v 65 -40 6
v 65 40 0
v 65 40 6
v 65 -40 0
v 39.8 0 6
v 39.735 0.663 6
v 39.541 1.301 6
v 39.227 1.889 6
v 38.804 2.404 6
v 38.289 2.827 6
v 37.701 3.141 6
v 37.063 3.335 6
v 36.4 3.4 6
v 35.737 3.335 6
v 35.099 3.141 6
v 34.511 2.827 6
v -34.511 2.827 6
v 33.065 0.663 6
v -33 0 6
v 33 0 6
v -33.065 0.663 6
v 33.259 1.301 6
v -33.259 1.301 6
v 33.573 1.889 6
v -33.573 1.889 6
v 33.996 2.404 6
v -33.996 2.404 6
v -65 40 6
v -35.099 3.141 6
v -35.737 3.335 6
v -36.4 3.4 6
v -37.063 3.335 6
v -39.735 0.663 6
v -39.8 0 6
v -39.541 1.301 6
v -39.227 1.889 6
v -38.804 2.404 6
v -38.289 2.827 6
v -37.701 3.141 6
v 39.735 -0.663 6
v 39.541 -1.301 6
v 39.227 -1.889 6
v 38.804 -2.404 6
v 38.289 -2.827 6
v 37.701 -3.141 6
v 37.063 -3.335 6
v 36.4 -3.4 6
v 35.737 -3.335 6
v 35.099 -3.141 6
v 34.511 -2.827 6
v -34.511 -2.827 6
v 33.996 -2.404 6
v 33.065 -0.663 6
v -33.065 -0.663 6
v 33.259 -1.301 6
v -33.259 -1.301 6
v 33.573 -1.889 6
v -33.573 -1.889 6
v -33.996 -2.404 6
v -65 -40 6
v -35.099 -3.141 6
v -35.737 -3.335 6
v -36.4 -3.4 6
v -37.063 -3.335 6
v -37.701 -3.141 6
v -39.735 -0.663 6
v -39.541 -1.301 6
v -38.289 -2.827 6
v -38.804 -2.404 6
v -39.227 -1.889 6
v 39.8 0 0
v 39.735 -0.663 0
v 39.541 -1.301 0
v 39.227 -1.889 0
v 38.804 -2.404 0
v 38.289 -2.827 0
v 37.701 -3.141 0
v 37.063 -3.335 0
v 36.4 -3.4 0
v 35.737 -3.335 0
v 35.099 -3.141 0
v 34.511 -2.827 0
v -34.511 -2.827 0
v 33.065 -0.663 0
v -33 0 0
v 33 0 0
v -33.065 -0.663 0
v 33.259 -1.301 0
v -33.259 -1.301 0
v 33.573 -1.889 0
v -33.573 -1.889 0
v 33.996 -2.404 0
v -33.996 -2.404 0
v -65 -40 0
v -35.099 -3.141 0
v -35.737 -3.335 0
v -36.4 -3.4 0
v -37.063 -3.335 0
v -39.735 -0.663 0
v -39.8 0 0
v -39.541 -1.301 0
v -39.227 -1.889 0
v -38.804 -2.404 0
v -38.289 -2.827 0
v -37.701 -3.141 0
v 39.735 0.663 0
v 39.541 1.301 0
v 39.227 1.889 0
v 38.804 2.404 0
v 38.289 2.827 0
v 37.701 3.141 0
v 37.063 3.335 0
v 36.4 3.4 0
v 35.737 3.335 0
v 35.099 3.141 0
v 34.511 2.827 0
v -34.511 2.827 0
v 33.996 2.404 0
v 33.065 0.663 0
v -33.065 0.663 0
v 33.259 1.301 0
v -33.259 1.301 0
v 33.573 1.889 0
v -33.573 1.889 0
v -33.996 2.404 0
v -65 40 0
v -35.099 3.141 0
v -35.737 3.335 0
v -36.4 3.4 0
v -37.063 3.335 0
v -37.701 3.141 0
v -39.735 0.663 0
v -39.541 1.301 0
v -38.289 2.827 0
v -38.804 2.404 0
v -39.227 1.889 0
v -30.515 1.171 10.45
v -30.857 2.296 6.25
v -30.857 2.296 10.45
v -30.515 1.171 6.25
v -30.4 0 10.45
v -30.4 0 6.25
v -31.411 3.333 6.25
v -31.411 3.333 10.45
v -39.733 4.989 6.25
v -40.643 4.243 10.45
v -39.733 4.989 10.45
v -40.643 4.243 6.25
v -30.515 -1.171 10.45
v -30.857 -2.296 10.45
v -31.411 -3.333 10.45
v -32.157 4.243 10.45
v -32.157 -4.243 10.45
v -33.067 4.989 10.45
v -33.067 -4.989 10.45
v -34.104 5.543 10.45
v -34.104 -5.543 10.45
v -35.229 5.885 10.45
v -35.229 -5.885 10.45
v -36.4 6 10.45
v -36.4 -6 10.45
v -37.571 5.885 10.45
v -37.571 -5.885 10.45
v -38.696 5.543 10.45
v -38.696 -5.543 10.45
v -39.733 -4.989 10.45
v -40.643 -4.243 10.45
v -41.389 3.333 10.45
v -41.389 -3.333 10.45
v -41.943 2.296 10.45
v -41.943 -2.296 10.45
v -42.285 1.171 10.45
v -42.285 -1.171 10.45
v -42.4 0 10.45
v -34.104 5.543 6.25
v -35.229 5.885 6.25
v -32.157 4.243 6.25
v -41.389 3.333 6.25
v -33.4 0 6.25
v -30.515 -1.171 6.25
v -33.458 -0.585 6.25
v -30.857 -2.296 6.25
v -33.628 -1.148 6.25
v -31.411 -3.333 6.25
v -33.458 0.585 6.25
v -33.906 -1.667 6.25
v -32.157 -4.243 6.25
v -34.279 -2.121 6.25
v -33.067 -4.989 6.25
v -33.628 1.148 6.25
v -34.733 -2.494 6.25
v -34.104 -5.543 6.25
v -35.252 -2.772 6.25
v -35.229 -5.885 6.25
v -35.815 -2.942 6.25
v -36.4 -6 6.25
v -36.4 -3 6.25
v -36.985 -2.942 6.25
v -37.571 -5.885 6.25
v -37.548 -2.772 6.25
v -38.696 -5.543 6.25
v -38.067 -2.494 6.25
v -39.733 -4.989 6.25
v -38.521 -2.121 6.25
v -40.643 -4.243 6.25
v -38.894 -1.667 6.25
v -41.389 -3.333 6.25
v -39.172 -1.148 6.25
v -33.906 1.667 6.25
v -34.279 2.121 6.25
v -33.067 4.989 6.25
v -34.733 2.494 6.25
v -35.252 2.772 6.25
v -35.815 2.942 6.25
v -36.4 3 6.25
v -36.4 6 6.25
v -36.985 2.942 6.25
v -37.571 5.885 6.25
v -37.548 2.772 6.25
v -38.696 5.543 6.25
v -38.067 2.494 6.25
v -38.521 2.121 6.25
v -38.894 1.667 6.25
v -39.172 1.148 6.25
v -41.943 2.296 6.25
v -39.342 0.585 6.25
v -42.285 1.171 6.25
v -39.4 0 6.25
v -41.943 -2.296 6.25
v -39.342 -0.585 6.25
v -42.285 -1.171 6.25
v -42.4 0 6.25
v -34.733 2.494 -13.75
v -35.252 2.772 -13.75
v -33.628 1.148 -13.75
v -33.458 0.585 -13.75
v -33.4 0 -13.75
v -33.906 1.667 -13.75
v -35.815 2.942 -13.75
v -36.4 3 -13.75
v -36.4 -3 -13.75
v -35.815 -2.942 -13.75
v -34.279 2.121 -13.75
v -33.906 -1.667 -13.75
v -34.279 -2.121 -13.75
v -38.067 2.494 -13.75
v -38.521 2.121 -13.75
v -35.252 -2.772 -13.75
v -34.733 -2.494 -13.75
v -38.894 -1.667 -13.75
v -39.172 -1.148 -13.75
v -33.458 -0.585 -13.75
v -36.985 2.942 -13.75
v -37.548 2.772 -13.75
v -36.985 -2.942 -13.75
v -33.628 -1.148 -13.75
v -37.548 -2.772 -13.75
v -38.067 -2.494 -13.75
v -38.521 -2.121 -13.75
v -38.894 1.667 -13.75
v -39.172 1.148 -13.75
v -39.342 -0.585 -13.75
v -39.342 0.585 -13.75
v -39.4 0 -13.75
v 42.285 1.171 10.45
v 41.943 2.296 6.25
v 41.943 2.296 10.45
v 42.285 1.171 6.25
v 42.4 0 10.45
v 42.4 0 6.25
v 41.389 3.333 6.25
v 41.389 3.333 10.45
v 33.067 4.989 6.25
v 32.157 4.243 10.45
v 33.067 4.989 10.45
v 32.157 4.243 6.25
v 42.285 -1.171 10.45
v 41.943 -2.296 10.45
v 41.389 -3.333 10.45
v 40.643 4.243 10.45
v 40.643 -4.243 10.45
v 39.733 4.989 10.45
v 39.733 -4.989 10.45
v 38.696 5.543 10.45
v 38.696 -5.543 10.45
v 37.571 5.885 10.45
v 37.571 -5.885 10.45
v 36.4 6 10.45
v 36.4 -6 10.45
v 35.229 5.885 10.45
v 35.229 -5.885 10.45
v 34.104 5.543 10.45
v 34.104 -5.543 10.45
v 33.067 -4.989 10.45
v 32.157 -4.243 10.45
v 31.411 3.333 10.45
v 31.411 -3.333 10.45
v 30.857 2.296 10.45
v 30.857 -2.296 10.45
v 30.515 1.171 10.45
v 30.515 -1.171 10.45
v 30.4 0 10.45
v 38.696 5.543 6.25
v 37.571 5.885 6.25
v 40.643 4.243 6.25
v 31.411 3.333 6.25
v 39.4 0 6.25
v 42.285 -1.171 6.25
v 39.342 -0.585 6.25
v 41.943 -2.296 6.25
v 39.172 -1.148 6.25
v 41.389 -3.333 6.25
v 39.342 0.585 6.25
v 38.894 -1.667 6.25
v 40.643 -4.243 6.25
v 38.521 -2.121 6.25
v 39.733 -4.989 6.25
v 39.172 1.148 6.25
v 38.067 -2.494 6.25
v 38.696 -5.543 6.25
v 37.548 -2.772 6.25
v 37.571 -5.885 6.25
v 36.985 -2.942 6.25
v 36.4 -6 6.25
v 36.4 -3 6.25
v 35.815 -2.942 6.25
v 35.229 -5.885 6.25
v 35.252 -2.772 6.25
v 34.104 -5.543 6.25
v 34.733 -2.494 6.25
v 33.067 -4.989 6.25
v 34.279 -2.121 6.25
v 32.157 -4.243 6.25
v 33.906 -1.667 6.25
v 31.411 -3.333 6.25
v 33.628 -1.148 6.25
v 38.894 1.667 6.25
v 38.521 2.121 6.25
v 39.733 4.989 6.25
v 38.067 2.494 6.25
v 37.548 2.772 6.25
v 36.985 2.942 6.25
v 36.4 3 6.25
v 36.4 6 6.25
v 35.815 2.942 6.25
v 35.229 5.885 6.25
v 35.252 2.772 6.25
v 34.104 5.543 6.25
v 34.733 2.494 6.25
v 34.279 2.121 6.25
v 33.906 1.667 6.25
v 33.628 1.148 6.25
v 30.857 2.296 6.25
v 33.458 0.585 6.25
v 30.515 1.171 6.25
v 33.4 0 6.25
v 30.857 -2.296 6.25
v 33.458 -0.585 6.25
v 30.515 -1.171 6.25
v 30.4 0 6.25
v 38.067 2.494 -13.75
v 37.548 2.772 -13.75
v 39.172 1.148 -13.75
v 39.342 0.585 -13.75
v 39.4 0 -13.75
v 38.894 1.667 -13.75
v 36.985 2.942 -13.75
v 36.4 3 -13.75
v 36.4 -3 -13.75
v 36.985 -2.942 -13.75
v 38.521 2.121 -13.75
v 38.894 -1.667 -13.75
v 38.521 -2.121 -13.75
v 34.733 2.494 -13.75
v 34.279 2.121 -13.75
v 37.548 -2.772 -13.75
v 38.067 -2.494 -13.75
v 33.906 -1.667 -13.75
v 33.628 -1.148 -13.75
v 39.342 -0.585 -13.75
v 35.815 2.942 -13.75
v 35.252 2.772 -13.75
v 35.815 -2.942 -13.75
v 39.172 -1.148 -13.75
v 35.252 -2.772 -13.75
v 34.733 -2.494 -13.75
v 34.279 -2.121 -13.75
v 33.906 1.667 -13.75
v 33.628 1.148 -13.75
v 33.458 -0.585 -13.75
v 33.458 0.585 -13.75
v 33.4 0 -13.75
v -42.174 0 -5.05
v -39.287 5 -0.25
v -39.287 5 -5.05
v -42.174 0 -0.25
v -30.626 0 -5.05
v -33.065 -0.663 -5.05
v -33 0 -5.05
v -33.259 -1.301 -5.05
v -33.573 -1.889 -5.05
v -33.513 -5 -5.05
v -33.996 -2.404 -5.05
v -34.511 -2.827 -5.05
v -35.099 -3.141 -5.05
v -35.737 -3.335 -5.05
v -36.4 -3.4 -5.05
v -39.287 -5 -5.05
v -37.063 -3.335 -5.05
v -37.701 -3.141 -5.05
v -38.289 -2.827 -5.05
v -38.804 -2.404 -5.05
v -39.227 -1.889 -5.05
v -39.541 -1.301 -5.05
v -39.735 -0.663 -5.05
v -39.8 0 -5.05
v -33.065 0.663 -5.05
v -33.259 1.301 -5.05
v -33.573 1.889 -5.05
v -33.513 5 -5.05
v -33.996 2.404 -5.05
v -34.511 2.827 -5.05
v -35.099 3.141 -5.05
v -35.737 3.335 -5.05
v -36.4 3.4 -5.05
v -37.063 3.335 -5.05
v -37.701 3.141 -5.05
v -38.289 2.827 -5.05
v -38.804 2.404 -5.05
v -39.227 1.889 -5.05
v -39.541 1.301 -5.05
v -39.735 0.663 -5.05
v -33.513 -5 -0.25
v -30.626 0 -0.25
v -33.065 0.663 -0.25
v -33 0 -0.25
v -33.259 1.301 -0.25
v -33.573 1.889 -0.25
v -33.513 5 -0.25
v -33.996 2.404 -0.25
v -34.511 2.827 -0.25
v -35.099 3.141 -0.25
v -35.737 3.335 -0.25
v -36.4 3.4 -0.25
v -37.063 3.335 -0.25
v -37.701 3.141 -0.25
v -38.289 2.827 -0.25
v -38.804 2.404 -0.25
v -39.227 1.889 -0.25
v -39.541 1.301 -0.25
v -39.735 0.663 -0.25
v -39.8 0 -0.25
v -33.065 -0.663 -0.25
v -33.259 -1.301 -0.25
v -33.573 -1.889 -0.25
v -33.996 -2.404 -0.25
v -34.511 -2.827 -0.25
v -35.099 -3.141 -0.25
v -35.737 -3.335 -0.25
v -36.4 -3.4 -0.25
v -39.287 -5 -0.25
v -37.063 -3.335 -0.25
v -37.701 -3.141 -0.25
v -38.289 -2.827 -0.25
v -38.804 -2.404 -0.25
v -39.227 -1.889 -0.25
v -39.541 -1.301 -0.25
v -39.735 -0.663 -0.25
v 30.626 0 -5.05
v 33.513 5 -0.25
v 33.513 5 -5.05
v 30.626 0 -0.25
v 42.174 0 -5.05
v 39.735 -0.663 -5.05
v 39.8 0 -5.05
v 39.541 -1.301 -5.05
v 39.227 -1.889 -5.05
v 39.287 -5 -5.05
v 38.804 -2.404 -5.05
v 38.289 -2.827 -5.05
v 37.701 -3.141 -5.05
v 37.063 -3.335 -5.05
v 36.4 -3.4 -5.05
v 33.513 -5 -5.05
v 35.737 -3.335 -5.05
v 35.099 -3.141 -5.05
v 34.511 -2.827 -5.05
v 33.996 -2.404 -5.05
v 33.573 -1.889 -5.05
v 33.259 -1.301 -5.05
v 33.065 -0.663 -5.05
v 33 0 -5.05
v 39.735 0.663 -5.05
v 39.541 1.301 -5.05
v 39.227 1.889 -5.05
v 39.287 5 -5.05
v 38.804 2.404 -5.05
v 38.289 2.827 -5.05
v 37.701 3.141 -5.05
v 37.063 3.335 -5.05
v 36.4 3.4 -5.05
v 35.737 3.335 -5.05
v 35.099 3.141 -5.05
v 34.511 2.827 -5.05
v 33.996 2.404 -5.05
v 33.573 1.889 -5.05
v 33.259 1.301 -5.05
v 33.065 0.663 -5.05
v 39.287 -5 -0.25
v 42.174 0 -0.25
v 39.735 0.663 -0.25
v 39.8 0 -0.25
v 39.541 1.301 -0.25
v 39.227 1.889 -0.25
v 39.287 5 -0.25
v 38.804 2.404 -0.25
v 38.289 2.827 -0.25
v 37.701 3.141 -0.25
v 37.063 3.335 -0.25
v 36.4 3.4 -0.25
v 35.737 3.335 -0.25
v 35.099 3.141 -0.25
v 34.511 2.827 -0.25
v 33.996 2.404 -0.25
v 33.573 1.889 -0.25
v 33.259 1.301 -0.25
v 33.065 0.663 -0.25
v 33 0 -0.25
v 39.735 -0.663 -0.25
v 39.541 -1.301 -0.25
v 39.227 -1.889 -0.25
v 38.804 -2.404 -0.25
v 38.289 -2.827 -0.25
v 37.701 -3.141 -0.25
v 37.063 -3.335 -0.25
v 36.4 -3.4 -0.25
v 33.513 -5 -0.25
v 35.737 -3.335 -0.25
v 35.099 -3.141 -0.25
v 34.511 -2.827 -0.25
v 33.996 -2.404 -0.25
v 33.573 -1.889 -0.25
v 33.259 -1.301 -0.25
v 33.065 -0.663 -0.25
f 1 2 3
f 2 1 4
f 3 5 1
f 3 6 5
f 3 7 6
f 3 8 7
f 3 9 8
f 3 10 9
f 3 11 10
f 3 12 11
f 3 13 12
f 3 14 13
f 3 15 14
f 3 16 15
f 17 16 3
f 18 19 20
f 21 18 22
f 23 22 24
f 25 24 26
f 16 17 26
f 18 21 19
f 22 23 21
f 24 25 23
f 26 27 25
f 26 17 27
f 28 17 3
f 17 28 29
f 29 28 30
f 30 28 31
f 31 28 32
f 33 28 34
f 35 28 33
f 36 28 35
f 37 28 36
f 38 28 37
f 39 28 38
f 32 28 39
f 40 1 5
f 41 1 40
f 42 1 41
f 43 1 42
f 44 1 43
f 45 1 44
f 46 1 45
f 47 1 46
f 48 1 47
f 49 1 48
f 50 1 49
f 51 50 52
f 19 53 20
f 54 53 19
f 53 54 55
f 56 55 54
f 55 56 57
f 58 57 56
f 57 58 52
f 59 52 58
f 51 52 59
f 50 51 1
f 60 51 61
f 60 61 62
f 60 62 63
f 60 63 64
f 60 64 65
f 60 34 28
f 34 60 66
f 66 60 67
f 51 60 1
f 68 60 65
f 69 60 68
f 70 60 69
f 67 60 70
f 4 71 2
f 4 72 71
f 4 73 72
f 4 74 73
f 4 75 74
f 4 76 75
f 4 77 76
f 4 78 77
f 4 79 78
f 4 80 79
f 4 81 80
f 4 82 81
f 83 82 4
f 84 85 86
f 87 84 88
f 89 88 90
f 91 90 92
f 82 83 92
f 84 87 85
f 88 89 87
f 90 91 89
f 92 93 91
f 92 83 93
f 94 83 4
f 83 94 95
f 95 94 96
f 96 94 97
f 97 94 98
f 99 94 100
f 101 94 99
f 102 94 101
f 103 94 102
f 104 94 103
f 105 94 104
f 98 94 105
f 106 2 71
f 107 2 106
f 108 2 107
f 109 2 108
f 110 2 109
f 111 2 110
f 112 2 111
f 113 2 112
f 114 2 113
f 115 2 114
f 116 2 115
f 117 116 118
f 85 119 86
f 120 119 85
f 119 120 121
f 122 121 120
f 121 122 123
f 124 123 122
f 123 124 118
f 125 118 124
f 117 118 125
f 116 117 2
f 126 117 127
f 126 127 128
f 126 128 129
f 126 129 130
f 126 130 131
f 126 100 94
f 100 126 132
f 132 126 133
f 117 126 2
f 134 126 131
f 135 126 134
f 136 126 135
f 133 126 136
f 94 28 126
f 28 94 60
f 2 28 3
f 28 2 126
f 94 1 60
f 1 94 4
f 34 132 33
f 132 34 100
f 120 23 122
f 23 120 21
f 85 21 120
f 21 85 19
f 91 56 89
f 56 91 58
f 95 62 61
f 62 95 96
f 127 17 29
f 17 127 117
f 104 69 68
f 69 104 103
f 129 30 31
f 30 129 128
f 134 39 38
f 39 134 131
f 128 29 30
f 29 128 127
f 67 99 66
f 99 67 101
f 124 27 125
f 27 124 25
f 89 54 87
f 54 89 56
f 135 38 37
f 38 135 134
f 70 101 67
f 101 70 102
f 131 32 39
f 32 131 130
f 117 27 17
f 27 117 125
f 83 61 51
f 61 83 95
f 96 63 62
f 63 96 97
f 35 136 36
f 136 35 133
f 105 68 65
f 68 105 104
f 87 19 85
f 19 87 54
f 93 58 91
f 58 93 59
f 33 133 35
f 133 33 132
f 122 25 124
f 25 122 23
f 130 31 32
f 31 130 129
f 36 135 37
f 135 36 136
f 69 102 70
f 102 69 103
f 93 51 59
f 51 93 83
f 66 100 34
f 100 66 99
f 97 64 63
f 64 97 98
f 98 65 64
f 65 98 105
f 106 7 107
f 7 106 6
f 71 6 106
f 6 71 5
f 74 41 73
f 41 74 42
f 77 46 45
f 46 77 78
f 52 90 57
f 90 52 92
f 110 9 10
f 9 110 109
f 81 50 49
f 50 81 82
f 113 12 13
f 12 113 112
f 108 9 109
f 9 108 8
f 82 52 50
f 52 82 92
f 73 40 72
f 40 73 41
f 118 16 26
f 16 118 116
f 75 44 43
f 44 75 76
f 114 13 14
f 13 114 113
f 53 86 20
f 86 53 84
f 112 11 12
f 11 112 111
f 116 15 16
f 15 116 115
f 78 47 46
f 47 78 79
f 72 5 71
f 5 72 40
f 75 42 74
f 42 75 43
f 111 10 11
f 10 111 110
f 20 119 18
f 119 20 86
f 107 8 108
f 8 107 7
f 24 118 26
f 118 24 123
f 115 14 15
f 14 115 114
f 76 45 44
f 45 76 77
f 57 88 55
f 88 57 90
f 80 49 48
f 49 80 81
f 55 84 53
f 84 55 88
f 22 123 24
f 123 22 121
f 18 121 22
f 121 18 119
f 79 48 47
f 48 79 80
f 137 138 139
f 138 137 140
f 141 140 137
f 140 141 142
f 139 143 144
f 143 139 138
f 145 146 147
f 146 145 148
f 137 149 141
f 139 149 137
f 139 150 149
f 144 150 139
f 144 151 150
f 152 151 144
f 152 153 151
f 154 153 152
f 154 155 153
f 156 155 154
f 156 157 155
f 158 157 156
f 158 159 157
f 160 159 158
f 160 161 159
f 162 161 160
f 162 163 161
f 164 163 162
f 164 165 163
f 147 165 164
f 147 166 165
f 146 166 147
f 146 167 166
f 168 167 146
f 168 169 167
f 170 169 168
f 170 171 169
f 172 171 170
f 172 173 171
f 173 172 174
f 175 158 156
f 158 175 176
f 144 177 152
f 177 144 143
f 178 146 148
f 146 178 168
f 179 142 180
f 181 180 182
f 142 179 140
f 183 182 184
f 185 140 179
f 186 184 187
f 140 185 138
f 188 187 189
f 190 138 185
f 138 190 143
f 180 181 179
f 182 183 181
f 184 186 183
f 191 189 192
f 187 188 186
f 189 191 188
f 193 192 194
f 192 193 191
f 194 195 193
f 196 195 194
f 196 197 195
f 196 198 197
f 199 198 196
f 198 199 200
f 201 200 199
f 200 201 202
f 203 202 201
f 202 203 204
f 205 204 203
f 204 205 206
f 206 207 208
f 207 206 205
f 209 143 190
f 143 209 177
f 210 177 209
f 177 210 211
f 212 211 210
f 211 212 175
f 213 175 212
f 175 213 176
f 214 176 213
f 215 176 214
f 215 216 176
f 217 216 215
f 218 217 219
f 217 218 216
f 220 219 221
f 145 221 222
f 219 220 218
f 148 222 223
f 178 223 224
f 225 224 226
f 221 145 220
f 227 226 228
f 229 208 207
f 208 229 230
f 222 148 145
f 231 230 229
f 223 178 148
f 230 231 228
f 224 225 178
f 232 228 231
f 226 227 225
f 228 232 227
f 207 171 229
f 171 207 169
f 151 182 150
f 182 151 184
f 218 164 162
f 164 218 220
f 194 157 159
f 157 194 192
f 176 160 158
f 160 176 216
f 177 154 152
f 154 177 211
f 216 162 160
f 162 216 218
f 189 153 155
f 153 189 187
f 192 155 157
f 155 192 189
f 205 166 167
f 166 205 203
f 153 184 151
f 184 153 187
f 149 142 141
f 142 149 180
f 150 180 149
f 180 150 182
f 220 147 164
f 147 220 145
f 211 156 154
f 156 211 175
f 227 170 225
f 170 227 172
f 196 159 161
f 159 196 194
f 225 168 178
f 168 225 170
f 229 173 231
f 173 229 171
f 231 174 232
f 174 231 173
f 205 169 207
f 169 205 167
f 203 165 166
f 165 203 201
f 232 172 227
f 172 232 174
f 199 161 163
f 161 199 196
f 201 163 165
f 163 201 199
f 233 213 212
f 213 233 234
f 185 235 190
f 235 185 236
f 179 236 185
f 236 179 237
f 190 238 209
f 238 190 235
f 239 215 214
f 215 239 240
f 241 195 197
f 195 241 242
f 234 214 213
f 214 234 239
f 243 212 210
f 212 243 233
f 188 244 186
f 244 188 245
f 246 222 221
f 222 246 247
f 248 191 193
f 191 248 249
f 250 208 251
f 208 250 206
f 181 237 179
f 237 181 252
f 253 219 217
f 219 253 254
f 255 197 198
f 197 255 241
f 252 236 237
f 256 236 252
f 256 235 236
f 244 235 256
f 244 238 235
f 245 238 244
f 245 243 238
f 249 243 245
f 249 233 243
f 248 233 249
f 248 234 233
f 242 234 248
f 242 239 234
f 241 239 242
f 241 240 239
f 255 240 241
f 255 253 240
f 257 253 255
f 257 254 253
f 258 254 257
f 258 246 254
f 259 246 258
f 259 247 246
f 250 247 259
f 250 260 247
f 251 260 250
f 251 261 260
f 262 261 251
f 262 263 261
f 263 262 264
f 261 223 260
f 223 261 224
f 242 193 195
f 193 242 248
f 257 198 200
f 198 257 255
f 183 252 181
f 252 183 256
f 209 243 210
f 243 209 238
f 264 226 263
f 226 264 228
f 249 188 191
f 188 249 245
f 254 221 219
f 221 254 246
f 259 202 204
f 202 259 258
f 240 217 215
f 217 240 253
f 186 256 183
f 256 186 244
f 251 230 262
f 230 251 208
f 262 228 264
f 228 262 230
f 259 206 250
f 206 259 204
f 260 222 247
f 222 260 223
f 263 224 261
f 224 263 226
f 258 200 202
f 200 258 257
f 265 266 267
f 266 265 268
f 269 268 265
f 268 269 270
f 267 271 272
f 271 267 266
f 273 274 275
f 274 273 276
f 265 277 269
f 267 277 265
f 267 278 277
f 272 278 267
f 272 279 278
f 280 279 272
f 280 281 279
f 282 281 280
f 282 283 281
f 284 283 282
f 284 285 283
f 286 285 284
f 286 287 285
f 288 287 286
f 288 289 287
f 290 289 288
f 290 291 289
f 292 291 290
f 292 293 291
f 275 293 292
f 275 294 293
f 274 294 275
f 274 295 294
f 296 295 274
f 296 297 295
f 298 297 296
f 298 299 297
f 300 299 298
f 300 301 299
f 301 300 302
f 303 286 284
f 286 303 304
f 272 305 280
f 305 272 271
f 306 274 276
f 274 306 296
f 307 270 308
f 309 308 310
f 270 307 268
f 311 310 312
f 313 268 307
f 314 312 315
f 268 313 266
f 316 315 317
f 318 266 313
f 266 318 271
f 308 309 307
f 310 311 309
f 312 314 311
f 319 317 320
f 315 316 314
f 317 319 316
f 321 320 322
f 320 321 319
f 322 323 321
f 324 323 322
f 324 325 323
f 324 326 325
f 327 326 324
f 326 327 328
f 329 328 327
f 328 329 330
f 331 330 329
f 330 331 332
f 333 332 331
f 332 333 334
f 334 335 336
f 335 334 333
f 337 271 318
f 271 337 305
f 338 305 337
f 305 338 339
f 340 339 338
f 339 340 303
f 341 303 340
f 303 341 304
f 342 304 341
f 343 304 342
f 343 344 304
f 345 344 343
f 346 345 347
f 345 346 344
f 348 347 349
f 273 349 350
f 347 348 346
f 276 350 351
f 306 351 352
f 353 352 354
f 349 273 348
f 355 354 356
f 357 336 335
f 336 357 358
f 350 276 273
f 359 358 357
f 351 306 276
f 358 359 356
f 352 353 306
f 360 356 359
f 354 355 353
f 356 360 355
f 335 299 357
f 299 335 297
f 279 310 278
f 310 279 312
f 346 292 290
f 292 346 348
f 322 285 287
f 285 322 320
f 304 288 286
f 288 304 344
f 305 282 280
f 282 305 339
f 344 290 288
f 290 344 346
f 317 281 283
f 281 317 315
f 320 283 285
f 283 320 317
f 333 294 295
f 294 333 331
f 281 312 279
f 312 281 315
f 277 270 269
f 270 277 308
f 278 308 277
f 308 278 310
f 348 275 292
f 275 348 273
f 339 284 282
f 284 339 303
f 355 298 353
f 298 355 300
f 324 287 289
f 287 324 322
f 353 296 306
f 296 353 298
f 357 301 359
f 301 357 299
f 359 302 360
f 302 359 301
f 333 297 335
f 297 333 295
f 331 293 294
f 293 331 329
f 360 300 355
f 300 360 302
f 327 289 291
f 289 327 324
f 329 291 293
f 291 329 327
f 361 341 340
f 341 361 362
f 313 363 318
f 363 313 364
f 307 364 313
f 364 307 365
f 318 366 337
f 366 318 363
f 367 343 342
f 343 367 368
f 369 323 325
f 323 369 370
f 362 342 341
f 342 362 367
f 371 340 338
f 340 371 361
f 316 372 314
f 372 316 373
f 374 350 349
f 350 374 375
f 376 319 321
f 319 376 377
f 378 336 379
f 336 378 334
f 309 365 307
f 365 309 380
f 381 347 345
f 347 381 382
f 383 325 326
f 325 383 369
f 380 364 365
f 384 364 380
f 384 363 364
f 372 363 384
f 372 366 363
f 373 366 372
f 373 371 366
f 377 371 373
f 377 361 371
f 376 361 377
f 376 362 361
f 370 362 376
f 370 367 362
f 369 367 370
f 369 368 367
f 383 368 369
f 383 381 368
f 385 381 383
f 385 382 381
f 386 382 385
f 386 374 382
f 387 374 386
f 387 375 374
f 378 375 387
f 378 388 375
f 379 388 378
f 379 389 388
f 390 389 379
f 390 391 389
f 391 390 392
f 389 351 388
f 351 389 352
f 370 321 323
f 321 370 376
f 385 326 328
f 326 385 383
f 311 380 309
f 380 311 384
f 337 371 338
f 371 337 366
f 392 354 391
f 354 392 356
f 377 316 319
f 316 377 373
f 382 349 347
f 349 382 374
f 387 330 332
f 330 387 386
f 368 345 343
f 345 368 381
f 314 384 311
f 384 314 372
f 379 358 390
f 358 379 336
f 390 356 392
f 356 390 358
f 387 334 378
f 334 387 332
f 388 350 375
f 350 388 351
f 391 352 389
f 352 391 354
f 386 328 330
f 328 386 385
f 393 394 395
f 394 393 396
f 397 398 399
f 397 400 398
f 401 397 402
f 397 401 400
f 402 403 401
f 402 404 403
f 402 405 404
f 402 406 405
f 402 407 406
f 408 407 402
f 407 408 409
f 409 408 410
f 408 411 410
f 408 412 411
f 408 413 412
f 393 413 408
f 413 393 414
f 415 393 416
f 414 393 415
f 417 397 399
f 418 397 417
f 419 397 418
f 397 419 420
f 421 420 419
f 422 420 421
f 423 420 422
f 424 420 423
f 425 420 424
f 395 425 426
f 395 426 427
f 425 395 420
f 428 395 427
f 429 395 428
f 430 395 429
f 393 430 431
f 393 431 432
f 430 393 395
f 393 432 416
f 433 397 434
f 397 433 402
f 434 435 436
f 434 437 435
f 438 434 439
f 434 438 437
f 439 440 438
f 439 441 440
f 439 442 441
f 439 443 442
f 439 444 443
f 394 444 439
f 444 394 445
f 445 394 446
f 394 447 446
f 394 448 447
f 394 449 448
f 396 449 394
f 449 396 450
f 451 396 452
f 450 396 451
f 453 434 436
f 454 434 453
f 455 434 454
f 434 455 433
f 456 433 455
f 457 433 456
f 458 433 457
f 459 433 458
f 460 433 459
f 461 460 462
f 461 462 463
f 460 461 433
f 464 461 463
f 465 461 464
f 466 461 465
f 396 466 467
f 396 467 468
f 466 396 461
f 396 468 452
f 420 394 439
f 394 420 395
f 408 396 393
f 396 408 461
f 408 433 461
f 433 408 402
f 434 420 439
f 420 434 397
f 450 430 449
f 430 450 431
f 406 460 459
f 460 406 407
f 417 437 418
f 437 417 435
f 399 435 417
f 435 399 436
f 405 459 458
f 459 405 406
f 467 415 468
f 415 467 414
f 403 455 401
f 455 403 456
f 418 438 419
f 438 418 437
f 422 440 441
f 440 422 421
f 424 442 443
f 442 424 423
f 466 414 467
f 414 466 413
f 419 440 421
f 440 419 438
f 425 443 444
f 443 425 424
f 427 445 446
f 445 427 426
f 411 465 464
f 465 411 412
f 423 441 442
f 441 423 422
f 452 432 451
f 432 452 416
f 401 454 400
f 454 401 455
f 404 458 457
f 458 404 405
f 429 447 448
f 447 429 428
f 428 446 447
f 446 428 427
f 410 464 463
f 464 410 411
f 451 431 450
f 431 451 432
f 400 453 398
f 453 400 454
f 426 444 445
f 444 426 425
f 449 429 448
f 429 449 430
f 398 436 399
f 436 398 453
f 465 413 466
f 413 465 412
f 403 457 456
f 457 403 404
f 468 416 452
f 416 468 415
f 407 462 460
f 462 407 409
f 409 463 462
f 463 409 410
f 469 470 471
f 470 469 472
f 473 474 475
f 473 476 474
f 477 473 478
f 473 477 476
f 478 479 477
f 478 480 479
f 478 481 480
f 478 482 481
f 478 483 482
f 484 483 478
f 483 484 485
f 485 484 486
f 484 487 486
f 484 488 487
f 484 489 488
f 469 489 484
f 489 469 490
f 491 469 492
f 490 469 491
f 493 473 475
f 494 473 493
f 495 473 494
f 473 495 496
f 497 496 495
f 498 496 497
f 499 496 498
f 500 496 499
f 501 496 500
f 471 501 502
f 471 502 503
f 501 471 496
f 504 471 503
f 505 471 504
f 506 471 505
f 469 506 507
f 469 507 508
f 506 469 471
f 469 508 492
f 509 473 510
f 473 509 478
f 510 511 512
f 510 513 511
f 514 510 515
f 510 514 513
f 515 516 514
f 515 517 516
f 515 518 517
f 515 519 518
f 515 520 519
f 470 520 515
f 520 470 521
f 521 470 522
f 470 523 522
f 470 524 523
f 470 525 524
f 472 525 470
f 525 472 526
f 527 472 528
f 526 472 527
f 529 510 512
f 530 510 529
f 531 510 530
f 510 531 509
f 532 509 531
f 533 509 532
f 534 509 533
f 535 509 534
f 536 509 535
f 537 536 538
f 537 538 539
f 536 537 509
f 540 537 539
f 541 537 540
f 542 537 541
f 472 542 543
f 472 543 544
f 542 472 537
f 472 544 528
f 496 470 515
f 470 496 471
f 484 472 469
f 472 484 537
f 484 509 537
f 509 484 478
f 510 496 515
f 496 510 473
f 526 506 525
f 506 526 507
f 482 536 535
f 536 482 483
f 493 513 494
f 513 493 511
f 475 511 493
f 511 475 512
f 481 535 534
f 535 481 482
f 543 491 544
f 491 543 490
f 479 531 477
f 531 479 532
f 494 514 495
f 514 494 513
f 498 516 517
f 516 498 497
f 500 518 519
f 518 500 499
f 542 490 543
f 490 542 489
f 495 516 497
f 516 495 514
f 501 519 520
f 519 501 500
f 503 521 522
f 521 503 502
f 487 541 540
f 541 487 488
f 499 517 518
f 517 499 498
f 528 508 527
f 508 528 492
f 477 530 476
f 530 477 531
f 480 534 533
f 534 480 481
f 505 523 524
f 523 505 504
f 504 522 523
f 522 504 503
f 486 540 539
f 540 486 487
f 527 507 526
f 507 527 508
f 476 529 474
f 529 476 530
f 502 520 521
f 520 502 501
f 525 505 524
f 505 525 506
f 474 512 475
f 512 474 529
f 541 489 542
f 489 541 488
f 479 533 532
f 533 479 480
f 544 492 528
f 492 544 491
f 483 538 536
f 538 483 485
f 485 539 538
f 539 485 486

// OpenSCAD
$fn = 32;

// ------------------------------------------------------------------------
// Bolted plate: 130 x 80 x 6 mm plate, 2 fasteners
// Every part is its own module, assembly() places them once.
// ------------------------------------------------------------------------

// --- part 1 ---
module plate() {
  difference() {
    translate([-65, -40, 0]) cube([130, 80, 6]);
    translate([-36.4, 0, -1]) cylinder(h = 8, d = 6.8);
    translate([36.4, 0, -1]) cylinder(h = 8, d = 6.8);
  }
}

// --- part 2 ---
module bolt1() {
  cylinder(h = 4.2, d = 12);
  translate([0, 0, -20]) cylinder(h = 20, d = 6);
}

// --- part 3 ---
module bolt2() {
  cylinder(h = 4.2, d = 12);
  translate([0, 0, -20]) cylinder(h = 20, d = 6);
}

// --- part 4 ---
module nut1() {
  difference() {
    linear_extrude(height = 4.8) polygon(points = [[5.774, 0], [2.887, 5], [-2.887, 5], [-5.774, 0], [-2.887, -5], [2.887, -5]]);
    translate([0, 0, -1]) cylinder(h = 6.8, d = 6.8);
  }
}

// --- part 5 ---
module nut2() {
  difference() {
    linear_extrude(height = 4.8) polygon(points = [[5.774, 0], [2.887, 5], [-2.887, 5], [-5.774, 0], [-2.887, -5], [2.887, -5]]);
    translate([0, 0, -1]) cylinder(h = 6.8, d = 6.8);
  }
}

// --- assembly ---
module assembly() {
  translate([0, 0, 0]) rotate([0, 0, 0]) plate();
  translate([-36.4, 0, 6.25]) rotate([0, 0, 0]) bolt1();
  translate([36.4, 0, 6.25]) rotate([0, 0, 0]) bolt2();
  translate([-36.4, 0, -5.05]) rotate([0, 0, 0]) nut1();
  translate([36.4, 0, -5.05]) rotate([0, 0, 0]) nut2();
}

assembly();
